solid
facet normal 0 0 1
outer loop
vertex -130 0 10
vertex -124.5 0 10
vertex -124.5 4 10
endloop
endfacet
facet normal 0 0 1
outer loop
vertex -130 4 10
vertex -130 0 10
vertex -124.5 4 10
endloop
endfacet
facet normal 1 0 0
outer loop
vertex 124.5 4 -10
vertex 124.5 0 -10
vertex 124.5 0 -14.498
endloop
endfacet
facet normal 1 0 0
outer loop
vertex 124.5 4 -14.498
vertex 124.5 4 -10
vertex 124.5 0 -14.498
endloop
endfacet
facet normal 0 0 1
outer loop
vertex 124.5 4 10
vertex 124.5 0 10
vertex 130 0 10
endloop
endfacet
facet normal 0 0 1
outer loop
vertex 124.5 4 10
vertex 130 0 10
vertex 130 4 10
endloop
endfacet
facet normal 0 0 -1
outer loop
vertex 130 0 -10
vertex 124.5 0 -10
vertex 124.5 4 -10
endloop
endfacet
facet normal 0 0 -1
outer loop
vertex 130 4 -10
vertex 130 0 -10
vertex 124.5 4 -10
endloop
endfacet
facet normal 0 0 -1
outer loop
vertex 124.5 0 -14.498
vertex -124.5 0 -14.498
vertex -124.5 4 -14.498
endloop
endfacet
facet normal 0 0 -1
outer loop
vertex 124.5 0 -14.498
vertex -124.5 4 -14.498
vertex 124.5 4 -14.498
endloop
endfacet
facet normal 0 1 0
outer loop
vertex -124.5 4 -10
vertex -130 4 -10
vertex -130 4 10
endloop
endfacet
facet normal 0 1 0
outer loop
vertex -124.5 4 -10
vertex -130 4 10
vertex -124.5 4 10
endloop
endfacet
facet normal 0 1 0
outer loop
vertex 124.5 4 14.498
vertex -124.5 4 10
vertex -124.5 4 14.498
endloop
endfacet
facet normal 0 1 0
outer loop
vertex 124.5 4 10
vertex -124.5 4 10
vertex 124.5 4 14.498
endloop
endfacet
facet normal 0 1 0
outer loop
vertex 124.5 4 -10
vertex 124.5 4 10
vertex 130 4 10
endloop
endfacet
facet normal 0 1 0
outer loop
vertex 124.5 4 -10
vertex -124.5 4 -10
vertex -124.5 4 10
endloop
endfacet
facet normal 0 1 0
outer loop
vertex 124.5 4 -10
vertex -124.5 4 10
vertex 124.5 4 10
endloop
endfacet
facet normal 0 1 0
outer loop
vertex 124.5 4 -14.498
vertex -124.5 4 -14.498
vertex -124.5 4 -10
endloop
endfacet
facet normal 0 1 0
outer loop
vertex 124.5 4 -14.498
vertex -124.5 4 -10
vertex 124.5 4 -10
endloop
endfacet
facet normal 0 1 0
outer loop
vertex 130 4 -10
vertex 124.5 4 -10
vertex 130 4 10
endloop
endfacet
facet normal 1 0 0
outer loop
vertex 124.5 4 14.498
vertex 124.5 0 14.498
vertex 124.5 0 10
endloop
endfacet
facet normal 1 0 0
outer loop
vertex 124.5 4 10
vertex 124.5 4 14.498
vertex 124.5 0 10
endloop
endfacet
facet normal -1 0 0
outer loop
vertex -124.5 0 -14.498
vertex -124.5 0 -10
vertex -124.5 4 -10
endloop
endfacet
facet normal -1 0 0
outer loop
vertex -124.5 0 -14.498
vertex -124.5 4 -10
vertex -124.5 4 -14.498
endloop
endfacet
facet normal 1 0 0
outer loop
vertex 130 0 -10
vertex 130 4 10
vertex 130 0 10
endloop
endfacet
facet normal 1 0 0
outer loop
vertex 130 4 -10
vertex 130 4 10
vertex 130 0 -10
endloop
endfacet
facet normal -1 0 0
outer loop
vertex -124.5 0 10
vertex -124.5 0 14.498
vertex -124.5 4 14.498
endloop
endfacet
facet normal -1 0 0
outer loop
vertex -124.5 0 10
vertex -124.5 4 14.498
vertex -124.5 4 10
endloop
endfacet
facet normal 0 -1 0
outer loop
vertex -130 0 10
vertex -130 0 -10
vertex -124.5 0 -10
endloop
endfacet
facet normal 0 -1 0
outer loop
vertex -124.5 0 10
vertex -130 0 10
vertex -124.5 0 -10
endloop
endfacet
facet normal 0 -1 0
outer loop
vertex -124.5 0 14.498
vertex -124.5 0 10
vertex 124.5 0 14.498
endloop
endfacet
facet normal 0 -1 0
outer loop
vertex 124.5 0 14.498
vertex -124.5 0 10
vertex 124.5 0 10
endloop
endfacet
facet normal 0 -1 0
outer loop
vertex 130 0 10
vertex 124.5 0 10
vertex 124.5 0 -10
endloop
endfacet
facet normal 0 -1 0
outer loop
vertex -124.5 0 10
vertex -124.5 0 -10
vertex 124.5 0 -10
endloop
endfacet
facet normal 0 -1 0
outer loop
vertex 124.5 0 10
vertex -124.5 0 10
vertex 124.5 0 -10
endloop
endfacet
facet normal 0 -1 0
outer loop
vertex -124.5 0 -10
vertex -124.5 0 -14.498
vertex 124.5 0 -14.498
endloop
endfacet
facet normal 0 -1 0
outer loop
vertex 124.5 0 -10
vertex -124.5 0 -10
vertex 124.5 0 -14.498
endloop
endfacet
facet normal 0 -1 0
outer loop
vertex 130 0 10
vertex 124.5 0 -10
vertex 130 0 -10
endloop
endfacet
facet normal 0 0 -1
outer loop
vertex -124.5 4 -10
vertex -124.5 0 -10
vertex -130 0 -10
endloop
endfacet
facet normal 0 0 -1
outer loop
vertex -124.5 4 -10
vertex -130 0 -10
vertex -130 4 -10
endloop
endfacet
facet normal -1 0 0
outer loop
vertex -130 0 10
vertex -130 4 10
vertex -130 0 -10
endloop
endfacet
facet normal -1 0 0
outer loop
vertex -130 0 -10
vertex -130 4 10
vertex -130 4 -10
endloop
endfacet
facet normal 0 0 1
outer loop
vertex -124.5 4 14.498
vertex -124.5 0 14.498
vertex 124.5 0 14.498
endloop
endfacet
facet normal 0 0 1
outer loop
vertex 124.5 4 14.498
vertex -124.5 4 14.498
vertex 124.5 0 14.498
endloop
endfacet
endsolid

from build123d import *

# Parameters (mm, degrees)
SKETCH_1_W      = 249
SKETCH_1_H      = 28.996988848
EXTRUDE_1_DEPTH = 4
SKETCH_2_W      = 20
SKETCH_2_H      = 4
EXTRUDE_2_DEPTH = 5.5


with BuildPart() as part:
    # Эскиз1 → Бобышка-Вытянуть1 (new body)
    with BuildSketch(Plane(origin=(0, 0, 0), x_dir=(1, 0, 0), z_dir=(0, 1, 0))):
        Rectangle(SKETCH_1_W, SKETCH_1_H)
    extrude(amount=EXTRUDE_1_DEPTH)

    # Эскиз2 → Бобышка-Вытянуть2 (add)
    with BuildSketch(Plane(origin=(124.5, 0, 0), x_dir=(0, 0, -1), z_dir=(1, 0, 0))):
        with Locations((0, 2)):
            Rectangle(SKETCH_2_W, SKETCH_2_H)
    extrude_2 = extrude(amount=EXTRUDE_2_DEPTH)

    # Mirror1: Бобышка-Вытянуть2 across plane
    add(extrude_2.mirror(Plane(origin=(0, 0, 0), x_dir=(0, 0, 1), z_dir=(1, 0, 0))))


solid = part.part
